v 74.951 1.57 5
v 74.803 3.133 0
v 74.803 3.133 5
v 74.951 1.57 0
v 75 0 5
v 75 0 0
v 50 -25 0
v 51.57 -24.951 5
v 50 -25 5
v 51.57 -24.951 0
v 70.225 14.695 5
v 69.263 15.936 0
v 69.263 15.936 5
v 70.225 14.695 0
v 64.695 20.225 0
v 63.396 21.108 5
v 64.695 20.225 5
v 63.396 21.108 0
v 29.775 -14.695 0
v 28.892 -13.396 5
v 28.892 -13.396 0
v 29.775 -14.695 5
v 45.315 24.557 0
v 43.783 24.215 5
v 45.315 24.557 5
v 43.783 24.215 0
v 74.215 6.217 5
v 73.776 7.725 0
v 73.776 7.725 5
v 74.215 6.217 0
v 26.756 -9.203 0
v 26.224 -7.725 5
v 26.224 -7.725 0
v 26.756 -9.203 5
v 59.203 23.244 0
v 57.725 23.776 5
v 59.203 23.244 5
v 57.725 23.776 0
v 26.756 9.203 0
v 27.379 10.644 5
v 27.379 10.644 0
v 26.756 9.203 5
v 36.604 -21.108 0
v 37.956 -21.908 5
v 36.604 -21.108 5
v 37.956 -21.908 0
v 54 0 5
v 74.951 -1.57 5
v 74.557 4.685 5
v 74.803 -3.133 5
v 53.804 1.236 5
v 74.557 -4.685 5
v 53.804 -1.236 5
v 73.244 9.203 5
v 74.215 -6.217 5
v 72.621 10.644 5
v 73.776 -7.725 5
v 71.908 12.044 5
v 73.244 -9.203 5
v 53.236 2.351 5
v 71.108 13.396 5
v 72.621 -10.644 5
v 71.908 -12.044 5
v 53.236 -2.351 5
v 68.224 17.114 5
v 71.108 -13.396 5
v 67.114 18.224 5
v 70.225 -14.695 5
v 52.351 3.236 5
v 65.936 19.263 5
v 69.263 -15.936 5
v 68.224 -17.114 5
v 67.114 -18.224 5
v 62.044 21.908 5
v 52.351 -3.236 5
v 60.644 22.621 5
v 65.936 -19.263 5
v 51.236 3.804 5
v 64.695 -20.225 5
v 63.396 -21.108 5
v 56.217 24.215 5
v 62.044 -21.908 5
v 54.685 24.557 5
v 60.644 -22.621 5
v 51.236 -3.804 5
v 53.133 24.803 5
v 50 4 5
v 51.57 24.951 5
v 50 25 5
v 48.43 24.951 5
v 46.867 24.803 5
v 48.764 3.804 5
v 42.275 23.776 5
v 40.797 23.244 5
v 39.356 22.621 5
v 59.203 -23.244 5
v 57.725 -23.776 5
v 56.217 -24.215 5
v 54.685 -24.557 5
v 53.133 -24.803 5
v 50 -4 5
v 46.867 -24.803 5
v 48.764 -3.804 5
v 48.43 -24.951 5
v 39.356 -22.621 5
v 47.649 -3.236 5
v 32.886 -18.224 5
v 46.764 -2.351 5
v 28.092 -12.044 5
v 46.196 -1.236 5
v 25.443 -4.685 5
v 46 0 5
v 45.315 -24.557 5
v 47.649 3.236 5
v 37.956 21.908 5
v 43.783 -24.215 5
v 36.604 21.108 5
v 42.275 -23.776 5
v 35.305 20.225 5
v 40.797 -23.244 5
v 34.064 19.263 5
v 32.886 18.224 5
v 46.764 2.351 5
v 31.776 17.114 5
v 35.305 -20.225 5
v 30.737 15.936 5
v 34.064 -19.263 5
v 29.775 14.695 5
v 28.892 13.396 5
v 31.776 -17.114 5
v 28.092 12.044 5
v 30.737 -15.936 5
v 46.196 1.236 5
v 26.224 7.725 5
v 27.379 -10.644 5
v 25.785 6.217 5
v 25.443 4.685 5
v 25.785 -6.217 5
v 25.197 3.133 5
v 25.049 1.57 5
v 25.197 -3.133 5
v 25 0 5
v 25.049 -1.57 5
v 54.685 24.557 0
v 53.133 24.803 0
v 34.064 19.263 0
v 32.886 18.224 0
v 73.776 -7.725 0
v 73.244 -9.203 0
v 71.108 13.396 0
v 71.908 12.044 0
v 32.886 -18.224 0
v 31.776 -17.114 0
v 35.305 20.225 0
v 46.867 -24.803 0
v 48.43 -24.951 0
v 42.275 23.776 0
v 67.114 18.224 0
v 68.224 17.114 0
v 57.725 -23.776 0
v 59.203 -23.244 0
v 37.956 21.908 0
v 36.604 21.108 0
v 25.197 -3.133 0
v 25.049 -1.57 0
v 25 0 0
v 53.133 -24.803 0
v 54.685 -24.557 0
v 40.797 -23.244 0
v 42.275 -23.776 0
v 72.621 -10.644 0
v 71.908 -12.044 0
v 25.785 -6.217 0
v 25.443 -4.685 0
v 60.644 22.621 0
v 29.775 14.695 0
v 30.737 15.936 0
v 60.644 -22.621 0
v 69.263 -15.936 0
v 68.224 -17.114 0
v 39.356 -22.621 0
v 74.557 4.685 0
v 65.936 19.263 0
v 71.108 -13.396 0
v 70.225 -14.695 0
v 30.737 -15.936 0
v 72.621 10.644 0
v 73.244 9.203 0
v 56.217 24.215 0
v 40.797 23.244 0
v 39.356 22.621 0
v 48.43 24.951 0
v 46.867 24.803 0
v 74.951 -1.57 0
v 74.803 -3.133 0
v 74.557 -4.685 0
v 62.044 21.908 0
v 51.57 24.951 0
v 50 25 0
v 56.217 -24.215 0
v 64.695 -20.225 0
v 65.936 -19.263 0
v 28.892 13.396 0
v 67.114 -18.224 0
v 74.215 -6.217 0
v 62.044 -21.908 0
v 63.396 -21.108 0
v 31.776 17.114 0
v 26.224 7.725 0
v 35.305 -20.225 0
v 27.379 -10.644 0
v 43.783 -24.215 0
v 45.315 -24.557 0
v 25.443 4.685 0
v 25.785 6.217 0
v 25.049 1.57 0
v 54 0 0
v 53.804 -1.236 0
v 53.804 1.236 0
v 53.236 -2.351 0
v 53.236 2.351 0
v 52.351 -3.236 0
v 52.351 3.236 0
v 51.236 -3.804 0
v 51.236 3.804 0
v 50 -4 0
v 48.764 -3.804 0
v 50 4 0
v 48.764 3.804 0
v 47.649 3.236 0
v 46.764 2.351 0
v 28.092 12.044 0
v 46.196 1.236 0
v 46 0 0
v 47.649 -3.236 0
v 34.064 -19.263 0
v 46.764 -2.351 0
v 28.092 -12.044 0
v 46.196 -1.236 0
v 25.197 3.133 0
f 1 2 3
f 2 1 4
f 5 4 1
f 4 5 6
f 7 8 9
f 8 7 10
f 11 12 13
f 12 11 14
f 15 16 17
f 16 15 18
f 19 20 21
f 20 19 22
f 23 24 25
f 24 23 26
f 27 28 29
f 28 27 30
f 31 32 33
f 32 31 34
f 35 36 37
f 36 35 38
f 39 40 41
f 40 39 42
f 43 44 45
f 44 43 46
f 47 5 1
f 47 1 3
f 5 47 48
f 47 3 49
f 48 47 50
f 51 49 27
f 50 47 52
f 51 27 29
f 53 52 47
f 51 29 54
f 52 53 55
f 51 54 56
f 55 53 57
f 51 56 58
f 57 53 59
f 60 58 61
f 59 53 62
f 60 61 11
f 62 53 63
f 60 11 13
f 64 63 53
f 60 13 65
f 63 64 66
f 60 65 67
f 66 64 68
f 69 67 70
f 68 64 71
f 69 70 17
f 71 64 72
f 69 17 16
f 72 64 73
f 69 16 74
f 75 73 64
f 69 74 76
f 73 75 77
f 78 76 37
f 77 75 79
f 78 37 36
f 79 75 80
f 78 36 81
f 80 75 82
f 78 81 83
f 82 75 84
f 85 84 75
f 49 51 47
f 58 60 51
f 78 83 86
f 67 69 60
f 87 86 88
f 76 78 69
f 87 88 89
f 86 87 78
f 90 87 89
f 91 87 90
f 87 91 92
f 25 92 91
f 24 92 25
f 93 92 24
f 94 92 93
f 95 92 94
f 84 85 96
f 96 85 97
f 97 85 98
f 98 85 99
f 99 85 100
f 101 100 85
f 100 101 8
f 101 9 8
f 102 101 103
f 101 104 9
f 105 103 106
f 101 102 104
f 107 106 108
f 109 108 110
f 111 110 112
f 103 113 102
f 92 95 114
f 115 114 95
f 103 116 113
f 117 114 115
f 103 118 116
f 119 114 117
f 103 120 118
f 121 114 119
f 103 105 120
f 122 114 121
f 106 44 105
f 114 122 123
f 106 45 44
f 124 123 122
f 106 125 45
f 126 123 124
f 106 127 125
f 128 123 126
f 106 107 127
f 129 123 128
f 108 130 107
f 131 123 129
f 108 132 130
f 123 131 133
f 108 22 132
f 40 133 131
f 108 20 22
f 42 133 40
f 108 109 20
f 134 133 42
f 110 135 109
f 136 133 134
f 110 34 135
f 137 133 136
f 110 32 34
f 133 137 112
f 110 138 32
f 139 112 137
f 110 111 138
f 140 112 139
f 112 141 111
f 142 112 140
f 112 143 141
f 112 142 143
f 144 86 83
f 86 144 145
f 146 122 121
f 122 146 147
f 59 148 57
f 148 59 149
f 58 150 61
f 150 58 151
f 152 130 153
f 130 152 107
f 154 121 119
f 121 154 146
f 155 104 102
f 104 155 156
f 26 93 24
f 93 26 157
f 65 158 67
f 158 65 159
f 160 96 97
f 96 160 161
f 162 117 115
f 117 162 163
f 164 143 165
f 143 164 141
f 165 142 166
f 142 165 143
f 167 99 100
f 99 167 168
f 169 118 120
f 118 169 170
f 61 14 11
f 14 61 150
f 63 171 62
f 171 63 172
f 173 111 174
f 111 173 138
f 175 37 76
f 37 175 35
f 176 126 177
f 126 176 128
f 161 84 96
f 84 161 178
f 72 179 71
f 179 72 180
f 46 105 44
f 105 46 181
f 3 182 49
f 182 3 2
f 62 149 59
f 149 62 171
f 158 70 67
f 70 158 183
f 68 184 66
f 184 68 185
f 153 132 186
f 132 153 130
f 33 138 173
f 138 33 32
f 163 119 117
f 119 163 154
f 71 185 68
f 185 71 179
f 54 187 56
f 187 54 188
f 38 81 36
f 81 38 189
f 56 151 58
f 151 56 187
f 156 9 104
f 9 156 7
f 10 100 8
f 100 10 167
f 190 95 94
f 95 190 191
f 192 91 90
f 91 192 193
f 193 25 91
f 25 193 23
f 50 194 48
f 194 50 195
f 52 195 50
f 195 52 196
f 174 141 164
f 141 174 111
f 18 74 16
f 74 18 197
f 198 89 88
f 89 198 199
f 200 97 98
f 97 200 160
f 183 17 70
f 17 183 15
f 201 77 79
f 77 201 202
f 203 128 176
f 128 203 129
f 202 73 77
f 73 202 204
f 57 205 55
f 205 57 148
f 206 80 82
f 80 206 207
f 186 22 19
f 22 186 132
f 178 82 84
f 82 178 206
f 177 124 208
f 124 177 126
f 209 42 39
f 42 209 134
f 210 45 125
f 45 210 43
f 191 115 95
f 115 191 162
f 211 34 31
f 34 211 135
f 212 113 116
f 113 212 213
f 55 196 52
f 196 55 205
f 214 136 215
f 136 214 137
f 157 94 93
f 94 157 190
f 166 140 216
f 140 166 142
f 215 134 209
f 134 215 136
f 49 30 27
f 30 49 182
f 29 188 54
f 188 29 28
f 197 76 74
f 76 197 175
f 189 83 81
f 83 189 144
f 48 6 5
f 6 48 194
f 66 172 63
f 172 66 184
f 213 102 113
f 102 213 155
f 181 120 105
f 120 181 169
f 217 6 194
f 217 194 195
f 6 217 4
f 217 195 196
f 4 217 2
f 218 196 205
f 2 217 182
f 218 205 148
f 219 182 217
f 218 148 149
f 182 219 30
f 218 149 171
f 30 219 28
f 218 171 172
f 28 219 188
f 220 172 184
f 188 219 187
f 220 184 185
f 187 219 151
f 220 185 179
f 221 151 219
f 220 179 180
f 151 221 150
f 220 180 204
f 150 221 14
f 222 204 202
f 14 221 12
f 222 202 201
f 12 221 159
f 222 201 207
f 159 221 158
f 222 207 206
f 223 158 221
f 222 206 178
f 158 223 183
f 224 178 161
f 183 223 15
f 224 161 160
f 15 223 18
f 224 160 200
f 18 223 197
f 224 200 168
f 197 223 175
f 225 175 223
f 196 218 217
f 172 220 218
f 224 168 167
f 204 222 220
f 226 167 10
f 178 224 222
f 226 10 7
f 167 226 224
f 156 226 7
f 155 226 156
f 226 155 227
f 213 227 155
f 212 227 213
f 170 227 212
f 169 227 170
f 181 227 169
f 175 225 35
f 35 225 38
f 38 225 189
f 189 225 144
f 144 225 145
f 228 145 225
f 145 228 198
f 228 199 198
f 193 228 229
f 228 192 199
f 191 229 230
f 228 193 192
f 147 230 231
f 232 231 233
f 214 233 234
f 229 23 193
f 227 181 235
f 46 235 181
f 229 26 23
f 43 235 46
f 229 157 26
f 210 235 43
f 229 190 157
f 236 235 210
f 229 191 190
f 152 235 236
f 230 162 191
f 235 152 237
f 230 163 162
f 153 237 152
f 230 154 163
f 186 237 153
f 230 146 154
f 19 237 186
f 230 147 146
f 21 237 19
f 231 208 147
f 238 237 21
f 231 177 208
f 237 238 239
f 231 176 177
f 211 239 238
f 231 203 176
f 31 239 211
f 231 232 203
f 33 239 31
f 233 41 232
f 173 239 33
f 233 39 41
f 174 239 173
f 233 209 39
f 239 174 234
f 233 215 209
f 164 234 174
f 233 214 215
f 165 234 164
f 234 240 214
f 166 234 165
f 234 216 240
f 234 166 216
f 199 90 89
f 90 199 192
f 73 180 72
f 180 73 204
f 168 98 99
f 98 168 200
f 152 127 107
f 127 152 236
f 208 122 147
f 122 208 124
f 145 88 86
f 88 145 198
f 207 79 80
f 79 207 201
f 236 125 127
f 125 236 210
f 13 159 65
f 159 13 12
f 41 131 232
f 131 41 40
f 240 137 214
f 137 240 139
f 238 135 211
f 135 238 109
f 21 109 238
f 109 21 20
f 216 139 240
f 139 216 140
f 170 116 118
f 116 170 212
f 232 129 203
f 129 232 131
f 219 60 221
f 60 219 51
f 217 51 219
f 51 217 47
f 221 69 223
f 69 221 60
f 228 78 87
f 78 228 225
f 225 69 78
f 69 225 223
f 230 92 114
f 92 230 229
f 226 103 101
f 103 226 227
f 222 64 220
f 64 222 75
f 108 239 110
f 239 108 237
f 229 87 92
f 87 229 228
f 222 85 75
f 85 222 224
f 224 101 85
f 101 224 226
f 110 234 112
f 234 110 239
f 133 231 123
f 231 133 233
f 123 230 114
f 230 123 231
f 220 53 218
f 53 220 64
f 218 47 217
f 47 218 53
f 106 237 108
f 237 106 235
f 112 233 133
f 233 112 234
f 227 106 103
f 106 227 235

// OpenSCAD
// En este ejemplo vamos a hacer taladros. 
translate([50, 0, 0])
difference(){
    // En primer lugar vamos a hacer una rueda con un agujero en medio
    cylinder(r=50/2, h=5, $fn=100); // Cilindro grande
    // Vamos a hacerle un agujero de M8 con 20 lados.
    // Para que atraviese completamente el cilindro grande, la centramos
    //     en el eje.
    cylinder(r=8/2, h=20, $fn=20, center=true);  
}
